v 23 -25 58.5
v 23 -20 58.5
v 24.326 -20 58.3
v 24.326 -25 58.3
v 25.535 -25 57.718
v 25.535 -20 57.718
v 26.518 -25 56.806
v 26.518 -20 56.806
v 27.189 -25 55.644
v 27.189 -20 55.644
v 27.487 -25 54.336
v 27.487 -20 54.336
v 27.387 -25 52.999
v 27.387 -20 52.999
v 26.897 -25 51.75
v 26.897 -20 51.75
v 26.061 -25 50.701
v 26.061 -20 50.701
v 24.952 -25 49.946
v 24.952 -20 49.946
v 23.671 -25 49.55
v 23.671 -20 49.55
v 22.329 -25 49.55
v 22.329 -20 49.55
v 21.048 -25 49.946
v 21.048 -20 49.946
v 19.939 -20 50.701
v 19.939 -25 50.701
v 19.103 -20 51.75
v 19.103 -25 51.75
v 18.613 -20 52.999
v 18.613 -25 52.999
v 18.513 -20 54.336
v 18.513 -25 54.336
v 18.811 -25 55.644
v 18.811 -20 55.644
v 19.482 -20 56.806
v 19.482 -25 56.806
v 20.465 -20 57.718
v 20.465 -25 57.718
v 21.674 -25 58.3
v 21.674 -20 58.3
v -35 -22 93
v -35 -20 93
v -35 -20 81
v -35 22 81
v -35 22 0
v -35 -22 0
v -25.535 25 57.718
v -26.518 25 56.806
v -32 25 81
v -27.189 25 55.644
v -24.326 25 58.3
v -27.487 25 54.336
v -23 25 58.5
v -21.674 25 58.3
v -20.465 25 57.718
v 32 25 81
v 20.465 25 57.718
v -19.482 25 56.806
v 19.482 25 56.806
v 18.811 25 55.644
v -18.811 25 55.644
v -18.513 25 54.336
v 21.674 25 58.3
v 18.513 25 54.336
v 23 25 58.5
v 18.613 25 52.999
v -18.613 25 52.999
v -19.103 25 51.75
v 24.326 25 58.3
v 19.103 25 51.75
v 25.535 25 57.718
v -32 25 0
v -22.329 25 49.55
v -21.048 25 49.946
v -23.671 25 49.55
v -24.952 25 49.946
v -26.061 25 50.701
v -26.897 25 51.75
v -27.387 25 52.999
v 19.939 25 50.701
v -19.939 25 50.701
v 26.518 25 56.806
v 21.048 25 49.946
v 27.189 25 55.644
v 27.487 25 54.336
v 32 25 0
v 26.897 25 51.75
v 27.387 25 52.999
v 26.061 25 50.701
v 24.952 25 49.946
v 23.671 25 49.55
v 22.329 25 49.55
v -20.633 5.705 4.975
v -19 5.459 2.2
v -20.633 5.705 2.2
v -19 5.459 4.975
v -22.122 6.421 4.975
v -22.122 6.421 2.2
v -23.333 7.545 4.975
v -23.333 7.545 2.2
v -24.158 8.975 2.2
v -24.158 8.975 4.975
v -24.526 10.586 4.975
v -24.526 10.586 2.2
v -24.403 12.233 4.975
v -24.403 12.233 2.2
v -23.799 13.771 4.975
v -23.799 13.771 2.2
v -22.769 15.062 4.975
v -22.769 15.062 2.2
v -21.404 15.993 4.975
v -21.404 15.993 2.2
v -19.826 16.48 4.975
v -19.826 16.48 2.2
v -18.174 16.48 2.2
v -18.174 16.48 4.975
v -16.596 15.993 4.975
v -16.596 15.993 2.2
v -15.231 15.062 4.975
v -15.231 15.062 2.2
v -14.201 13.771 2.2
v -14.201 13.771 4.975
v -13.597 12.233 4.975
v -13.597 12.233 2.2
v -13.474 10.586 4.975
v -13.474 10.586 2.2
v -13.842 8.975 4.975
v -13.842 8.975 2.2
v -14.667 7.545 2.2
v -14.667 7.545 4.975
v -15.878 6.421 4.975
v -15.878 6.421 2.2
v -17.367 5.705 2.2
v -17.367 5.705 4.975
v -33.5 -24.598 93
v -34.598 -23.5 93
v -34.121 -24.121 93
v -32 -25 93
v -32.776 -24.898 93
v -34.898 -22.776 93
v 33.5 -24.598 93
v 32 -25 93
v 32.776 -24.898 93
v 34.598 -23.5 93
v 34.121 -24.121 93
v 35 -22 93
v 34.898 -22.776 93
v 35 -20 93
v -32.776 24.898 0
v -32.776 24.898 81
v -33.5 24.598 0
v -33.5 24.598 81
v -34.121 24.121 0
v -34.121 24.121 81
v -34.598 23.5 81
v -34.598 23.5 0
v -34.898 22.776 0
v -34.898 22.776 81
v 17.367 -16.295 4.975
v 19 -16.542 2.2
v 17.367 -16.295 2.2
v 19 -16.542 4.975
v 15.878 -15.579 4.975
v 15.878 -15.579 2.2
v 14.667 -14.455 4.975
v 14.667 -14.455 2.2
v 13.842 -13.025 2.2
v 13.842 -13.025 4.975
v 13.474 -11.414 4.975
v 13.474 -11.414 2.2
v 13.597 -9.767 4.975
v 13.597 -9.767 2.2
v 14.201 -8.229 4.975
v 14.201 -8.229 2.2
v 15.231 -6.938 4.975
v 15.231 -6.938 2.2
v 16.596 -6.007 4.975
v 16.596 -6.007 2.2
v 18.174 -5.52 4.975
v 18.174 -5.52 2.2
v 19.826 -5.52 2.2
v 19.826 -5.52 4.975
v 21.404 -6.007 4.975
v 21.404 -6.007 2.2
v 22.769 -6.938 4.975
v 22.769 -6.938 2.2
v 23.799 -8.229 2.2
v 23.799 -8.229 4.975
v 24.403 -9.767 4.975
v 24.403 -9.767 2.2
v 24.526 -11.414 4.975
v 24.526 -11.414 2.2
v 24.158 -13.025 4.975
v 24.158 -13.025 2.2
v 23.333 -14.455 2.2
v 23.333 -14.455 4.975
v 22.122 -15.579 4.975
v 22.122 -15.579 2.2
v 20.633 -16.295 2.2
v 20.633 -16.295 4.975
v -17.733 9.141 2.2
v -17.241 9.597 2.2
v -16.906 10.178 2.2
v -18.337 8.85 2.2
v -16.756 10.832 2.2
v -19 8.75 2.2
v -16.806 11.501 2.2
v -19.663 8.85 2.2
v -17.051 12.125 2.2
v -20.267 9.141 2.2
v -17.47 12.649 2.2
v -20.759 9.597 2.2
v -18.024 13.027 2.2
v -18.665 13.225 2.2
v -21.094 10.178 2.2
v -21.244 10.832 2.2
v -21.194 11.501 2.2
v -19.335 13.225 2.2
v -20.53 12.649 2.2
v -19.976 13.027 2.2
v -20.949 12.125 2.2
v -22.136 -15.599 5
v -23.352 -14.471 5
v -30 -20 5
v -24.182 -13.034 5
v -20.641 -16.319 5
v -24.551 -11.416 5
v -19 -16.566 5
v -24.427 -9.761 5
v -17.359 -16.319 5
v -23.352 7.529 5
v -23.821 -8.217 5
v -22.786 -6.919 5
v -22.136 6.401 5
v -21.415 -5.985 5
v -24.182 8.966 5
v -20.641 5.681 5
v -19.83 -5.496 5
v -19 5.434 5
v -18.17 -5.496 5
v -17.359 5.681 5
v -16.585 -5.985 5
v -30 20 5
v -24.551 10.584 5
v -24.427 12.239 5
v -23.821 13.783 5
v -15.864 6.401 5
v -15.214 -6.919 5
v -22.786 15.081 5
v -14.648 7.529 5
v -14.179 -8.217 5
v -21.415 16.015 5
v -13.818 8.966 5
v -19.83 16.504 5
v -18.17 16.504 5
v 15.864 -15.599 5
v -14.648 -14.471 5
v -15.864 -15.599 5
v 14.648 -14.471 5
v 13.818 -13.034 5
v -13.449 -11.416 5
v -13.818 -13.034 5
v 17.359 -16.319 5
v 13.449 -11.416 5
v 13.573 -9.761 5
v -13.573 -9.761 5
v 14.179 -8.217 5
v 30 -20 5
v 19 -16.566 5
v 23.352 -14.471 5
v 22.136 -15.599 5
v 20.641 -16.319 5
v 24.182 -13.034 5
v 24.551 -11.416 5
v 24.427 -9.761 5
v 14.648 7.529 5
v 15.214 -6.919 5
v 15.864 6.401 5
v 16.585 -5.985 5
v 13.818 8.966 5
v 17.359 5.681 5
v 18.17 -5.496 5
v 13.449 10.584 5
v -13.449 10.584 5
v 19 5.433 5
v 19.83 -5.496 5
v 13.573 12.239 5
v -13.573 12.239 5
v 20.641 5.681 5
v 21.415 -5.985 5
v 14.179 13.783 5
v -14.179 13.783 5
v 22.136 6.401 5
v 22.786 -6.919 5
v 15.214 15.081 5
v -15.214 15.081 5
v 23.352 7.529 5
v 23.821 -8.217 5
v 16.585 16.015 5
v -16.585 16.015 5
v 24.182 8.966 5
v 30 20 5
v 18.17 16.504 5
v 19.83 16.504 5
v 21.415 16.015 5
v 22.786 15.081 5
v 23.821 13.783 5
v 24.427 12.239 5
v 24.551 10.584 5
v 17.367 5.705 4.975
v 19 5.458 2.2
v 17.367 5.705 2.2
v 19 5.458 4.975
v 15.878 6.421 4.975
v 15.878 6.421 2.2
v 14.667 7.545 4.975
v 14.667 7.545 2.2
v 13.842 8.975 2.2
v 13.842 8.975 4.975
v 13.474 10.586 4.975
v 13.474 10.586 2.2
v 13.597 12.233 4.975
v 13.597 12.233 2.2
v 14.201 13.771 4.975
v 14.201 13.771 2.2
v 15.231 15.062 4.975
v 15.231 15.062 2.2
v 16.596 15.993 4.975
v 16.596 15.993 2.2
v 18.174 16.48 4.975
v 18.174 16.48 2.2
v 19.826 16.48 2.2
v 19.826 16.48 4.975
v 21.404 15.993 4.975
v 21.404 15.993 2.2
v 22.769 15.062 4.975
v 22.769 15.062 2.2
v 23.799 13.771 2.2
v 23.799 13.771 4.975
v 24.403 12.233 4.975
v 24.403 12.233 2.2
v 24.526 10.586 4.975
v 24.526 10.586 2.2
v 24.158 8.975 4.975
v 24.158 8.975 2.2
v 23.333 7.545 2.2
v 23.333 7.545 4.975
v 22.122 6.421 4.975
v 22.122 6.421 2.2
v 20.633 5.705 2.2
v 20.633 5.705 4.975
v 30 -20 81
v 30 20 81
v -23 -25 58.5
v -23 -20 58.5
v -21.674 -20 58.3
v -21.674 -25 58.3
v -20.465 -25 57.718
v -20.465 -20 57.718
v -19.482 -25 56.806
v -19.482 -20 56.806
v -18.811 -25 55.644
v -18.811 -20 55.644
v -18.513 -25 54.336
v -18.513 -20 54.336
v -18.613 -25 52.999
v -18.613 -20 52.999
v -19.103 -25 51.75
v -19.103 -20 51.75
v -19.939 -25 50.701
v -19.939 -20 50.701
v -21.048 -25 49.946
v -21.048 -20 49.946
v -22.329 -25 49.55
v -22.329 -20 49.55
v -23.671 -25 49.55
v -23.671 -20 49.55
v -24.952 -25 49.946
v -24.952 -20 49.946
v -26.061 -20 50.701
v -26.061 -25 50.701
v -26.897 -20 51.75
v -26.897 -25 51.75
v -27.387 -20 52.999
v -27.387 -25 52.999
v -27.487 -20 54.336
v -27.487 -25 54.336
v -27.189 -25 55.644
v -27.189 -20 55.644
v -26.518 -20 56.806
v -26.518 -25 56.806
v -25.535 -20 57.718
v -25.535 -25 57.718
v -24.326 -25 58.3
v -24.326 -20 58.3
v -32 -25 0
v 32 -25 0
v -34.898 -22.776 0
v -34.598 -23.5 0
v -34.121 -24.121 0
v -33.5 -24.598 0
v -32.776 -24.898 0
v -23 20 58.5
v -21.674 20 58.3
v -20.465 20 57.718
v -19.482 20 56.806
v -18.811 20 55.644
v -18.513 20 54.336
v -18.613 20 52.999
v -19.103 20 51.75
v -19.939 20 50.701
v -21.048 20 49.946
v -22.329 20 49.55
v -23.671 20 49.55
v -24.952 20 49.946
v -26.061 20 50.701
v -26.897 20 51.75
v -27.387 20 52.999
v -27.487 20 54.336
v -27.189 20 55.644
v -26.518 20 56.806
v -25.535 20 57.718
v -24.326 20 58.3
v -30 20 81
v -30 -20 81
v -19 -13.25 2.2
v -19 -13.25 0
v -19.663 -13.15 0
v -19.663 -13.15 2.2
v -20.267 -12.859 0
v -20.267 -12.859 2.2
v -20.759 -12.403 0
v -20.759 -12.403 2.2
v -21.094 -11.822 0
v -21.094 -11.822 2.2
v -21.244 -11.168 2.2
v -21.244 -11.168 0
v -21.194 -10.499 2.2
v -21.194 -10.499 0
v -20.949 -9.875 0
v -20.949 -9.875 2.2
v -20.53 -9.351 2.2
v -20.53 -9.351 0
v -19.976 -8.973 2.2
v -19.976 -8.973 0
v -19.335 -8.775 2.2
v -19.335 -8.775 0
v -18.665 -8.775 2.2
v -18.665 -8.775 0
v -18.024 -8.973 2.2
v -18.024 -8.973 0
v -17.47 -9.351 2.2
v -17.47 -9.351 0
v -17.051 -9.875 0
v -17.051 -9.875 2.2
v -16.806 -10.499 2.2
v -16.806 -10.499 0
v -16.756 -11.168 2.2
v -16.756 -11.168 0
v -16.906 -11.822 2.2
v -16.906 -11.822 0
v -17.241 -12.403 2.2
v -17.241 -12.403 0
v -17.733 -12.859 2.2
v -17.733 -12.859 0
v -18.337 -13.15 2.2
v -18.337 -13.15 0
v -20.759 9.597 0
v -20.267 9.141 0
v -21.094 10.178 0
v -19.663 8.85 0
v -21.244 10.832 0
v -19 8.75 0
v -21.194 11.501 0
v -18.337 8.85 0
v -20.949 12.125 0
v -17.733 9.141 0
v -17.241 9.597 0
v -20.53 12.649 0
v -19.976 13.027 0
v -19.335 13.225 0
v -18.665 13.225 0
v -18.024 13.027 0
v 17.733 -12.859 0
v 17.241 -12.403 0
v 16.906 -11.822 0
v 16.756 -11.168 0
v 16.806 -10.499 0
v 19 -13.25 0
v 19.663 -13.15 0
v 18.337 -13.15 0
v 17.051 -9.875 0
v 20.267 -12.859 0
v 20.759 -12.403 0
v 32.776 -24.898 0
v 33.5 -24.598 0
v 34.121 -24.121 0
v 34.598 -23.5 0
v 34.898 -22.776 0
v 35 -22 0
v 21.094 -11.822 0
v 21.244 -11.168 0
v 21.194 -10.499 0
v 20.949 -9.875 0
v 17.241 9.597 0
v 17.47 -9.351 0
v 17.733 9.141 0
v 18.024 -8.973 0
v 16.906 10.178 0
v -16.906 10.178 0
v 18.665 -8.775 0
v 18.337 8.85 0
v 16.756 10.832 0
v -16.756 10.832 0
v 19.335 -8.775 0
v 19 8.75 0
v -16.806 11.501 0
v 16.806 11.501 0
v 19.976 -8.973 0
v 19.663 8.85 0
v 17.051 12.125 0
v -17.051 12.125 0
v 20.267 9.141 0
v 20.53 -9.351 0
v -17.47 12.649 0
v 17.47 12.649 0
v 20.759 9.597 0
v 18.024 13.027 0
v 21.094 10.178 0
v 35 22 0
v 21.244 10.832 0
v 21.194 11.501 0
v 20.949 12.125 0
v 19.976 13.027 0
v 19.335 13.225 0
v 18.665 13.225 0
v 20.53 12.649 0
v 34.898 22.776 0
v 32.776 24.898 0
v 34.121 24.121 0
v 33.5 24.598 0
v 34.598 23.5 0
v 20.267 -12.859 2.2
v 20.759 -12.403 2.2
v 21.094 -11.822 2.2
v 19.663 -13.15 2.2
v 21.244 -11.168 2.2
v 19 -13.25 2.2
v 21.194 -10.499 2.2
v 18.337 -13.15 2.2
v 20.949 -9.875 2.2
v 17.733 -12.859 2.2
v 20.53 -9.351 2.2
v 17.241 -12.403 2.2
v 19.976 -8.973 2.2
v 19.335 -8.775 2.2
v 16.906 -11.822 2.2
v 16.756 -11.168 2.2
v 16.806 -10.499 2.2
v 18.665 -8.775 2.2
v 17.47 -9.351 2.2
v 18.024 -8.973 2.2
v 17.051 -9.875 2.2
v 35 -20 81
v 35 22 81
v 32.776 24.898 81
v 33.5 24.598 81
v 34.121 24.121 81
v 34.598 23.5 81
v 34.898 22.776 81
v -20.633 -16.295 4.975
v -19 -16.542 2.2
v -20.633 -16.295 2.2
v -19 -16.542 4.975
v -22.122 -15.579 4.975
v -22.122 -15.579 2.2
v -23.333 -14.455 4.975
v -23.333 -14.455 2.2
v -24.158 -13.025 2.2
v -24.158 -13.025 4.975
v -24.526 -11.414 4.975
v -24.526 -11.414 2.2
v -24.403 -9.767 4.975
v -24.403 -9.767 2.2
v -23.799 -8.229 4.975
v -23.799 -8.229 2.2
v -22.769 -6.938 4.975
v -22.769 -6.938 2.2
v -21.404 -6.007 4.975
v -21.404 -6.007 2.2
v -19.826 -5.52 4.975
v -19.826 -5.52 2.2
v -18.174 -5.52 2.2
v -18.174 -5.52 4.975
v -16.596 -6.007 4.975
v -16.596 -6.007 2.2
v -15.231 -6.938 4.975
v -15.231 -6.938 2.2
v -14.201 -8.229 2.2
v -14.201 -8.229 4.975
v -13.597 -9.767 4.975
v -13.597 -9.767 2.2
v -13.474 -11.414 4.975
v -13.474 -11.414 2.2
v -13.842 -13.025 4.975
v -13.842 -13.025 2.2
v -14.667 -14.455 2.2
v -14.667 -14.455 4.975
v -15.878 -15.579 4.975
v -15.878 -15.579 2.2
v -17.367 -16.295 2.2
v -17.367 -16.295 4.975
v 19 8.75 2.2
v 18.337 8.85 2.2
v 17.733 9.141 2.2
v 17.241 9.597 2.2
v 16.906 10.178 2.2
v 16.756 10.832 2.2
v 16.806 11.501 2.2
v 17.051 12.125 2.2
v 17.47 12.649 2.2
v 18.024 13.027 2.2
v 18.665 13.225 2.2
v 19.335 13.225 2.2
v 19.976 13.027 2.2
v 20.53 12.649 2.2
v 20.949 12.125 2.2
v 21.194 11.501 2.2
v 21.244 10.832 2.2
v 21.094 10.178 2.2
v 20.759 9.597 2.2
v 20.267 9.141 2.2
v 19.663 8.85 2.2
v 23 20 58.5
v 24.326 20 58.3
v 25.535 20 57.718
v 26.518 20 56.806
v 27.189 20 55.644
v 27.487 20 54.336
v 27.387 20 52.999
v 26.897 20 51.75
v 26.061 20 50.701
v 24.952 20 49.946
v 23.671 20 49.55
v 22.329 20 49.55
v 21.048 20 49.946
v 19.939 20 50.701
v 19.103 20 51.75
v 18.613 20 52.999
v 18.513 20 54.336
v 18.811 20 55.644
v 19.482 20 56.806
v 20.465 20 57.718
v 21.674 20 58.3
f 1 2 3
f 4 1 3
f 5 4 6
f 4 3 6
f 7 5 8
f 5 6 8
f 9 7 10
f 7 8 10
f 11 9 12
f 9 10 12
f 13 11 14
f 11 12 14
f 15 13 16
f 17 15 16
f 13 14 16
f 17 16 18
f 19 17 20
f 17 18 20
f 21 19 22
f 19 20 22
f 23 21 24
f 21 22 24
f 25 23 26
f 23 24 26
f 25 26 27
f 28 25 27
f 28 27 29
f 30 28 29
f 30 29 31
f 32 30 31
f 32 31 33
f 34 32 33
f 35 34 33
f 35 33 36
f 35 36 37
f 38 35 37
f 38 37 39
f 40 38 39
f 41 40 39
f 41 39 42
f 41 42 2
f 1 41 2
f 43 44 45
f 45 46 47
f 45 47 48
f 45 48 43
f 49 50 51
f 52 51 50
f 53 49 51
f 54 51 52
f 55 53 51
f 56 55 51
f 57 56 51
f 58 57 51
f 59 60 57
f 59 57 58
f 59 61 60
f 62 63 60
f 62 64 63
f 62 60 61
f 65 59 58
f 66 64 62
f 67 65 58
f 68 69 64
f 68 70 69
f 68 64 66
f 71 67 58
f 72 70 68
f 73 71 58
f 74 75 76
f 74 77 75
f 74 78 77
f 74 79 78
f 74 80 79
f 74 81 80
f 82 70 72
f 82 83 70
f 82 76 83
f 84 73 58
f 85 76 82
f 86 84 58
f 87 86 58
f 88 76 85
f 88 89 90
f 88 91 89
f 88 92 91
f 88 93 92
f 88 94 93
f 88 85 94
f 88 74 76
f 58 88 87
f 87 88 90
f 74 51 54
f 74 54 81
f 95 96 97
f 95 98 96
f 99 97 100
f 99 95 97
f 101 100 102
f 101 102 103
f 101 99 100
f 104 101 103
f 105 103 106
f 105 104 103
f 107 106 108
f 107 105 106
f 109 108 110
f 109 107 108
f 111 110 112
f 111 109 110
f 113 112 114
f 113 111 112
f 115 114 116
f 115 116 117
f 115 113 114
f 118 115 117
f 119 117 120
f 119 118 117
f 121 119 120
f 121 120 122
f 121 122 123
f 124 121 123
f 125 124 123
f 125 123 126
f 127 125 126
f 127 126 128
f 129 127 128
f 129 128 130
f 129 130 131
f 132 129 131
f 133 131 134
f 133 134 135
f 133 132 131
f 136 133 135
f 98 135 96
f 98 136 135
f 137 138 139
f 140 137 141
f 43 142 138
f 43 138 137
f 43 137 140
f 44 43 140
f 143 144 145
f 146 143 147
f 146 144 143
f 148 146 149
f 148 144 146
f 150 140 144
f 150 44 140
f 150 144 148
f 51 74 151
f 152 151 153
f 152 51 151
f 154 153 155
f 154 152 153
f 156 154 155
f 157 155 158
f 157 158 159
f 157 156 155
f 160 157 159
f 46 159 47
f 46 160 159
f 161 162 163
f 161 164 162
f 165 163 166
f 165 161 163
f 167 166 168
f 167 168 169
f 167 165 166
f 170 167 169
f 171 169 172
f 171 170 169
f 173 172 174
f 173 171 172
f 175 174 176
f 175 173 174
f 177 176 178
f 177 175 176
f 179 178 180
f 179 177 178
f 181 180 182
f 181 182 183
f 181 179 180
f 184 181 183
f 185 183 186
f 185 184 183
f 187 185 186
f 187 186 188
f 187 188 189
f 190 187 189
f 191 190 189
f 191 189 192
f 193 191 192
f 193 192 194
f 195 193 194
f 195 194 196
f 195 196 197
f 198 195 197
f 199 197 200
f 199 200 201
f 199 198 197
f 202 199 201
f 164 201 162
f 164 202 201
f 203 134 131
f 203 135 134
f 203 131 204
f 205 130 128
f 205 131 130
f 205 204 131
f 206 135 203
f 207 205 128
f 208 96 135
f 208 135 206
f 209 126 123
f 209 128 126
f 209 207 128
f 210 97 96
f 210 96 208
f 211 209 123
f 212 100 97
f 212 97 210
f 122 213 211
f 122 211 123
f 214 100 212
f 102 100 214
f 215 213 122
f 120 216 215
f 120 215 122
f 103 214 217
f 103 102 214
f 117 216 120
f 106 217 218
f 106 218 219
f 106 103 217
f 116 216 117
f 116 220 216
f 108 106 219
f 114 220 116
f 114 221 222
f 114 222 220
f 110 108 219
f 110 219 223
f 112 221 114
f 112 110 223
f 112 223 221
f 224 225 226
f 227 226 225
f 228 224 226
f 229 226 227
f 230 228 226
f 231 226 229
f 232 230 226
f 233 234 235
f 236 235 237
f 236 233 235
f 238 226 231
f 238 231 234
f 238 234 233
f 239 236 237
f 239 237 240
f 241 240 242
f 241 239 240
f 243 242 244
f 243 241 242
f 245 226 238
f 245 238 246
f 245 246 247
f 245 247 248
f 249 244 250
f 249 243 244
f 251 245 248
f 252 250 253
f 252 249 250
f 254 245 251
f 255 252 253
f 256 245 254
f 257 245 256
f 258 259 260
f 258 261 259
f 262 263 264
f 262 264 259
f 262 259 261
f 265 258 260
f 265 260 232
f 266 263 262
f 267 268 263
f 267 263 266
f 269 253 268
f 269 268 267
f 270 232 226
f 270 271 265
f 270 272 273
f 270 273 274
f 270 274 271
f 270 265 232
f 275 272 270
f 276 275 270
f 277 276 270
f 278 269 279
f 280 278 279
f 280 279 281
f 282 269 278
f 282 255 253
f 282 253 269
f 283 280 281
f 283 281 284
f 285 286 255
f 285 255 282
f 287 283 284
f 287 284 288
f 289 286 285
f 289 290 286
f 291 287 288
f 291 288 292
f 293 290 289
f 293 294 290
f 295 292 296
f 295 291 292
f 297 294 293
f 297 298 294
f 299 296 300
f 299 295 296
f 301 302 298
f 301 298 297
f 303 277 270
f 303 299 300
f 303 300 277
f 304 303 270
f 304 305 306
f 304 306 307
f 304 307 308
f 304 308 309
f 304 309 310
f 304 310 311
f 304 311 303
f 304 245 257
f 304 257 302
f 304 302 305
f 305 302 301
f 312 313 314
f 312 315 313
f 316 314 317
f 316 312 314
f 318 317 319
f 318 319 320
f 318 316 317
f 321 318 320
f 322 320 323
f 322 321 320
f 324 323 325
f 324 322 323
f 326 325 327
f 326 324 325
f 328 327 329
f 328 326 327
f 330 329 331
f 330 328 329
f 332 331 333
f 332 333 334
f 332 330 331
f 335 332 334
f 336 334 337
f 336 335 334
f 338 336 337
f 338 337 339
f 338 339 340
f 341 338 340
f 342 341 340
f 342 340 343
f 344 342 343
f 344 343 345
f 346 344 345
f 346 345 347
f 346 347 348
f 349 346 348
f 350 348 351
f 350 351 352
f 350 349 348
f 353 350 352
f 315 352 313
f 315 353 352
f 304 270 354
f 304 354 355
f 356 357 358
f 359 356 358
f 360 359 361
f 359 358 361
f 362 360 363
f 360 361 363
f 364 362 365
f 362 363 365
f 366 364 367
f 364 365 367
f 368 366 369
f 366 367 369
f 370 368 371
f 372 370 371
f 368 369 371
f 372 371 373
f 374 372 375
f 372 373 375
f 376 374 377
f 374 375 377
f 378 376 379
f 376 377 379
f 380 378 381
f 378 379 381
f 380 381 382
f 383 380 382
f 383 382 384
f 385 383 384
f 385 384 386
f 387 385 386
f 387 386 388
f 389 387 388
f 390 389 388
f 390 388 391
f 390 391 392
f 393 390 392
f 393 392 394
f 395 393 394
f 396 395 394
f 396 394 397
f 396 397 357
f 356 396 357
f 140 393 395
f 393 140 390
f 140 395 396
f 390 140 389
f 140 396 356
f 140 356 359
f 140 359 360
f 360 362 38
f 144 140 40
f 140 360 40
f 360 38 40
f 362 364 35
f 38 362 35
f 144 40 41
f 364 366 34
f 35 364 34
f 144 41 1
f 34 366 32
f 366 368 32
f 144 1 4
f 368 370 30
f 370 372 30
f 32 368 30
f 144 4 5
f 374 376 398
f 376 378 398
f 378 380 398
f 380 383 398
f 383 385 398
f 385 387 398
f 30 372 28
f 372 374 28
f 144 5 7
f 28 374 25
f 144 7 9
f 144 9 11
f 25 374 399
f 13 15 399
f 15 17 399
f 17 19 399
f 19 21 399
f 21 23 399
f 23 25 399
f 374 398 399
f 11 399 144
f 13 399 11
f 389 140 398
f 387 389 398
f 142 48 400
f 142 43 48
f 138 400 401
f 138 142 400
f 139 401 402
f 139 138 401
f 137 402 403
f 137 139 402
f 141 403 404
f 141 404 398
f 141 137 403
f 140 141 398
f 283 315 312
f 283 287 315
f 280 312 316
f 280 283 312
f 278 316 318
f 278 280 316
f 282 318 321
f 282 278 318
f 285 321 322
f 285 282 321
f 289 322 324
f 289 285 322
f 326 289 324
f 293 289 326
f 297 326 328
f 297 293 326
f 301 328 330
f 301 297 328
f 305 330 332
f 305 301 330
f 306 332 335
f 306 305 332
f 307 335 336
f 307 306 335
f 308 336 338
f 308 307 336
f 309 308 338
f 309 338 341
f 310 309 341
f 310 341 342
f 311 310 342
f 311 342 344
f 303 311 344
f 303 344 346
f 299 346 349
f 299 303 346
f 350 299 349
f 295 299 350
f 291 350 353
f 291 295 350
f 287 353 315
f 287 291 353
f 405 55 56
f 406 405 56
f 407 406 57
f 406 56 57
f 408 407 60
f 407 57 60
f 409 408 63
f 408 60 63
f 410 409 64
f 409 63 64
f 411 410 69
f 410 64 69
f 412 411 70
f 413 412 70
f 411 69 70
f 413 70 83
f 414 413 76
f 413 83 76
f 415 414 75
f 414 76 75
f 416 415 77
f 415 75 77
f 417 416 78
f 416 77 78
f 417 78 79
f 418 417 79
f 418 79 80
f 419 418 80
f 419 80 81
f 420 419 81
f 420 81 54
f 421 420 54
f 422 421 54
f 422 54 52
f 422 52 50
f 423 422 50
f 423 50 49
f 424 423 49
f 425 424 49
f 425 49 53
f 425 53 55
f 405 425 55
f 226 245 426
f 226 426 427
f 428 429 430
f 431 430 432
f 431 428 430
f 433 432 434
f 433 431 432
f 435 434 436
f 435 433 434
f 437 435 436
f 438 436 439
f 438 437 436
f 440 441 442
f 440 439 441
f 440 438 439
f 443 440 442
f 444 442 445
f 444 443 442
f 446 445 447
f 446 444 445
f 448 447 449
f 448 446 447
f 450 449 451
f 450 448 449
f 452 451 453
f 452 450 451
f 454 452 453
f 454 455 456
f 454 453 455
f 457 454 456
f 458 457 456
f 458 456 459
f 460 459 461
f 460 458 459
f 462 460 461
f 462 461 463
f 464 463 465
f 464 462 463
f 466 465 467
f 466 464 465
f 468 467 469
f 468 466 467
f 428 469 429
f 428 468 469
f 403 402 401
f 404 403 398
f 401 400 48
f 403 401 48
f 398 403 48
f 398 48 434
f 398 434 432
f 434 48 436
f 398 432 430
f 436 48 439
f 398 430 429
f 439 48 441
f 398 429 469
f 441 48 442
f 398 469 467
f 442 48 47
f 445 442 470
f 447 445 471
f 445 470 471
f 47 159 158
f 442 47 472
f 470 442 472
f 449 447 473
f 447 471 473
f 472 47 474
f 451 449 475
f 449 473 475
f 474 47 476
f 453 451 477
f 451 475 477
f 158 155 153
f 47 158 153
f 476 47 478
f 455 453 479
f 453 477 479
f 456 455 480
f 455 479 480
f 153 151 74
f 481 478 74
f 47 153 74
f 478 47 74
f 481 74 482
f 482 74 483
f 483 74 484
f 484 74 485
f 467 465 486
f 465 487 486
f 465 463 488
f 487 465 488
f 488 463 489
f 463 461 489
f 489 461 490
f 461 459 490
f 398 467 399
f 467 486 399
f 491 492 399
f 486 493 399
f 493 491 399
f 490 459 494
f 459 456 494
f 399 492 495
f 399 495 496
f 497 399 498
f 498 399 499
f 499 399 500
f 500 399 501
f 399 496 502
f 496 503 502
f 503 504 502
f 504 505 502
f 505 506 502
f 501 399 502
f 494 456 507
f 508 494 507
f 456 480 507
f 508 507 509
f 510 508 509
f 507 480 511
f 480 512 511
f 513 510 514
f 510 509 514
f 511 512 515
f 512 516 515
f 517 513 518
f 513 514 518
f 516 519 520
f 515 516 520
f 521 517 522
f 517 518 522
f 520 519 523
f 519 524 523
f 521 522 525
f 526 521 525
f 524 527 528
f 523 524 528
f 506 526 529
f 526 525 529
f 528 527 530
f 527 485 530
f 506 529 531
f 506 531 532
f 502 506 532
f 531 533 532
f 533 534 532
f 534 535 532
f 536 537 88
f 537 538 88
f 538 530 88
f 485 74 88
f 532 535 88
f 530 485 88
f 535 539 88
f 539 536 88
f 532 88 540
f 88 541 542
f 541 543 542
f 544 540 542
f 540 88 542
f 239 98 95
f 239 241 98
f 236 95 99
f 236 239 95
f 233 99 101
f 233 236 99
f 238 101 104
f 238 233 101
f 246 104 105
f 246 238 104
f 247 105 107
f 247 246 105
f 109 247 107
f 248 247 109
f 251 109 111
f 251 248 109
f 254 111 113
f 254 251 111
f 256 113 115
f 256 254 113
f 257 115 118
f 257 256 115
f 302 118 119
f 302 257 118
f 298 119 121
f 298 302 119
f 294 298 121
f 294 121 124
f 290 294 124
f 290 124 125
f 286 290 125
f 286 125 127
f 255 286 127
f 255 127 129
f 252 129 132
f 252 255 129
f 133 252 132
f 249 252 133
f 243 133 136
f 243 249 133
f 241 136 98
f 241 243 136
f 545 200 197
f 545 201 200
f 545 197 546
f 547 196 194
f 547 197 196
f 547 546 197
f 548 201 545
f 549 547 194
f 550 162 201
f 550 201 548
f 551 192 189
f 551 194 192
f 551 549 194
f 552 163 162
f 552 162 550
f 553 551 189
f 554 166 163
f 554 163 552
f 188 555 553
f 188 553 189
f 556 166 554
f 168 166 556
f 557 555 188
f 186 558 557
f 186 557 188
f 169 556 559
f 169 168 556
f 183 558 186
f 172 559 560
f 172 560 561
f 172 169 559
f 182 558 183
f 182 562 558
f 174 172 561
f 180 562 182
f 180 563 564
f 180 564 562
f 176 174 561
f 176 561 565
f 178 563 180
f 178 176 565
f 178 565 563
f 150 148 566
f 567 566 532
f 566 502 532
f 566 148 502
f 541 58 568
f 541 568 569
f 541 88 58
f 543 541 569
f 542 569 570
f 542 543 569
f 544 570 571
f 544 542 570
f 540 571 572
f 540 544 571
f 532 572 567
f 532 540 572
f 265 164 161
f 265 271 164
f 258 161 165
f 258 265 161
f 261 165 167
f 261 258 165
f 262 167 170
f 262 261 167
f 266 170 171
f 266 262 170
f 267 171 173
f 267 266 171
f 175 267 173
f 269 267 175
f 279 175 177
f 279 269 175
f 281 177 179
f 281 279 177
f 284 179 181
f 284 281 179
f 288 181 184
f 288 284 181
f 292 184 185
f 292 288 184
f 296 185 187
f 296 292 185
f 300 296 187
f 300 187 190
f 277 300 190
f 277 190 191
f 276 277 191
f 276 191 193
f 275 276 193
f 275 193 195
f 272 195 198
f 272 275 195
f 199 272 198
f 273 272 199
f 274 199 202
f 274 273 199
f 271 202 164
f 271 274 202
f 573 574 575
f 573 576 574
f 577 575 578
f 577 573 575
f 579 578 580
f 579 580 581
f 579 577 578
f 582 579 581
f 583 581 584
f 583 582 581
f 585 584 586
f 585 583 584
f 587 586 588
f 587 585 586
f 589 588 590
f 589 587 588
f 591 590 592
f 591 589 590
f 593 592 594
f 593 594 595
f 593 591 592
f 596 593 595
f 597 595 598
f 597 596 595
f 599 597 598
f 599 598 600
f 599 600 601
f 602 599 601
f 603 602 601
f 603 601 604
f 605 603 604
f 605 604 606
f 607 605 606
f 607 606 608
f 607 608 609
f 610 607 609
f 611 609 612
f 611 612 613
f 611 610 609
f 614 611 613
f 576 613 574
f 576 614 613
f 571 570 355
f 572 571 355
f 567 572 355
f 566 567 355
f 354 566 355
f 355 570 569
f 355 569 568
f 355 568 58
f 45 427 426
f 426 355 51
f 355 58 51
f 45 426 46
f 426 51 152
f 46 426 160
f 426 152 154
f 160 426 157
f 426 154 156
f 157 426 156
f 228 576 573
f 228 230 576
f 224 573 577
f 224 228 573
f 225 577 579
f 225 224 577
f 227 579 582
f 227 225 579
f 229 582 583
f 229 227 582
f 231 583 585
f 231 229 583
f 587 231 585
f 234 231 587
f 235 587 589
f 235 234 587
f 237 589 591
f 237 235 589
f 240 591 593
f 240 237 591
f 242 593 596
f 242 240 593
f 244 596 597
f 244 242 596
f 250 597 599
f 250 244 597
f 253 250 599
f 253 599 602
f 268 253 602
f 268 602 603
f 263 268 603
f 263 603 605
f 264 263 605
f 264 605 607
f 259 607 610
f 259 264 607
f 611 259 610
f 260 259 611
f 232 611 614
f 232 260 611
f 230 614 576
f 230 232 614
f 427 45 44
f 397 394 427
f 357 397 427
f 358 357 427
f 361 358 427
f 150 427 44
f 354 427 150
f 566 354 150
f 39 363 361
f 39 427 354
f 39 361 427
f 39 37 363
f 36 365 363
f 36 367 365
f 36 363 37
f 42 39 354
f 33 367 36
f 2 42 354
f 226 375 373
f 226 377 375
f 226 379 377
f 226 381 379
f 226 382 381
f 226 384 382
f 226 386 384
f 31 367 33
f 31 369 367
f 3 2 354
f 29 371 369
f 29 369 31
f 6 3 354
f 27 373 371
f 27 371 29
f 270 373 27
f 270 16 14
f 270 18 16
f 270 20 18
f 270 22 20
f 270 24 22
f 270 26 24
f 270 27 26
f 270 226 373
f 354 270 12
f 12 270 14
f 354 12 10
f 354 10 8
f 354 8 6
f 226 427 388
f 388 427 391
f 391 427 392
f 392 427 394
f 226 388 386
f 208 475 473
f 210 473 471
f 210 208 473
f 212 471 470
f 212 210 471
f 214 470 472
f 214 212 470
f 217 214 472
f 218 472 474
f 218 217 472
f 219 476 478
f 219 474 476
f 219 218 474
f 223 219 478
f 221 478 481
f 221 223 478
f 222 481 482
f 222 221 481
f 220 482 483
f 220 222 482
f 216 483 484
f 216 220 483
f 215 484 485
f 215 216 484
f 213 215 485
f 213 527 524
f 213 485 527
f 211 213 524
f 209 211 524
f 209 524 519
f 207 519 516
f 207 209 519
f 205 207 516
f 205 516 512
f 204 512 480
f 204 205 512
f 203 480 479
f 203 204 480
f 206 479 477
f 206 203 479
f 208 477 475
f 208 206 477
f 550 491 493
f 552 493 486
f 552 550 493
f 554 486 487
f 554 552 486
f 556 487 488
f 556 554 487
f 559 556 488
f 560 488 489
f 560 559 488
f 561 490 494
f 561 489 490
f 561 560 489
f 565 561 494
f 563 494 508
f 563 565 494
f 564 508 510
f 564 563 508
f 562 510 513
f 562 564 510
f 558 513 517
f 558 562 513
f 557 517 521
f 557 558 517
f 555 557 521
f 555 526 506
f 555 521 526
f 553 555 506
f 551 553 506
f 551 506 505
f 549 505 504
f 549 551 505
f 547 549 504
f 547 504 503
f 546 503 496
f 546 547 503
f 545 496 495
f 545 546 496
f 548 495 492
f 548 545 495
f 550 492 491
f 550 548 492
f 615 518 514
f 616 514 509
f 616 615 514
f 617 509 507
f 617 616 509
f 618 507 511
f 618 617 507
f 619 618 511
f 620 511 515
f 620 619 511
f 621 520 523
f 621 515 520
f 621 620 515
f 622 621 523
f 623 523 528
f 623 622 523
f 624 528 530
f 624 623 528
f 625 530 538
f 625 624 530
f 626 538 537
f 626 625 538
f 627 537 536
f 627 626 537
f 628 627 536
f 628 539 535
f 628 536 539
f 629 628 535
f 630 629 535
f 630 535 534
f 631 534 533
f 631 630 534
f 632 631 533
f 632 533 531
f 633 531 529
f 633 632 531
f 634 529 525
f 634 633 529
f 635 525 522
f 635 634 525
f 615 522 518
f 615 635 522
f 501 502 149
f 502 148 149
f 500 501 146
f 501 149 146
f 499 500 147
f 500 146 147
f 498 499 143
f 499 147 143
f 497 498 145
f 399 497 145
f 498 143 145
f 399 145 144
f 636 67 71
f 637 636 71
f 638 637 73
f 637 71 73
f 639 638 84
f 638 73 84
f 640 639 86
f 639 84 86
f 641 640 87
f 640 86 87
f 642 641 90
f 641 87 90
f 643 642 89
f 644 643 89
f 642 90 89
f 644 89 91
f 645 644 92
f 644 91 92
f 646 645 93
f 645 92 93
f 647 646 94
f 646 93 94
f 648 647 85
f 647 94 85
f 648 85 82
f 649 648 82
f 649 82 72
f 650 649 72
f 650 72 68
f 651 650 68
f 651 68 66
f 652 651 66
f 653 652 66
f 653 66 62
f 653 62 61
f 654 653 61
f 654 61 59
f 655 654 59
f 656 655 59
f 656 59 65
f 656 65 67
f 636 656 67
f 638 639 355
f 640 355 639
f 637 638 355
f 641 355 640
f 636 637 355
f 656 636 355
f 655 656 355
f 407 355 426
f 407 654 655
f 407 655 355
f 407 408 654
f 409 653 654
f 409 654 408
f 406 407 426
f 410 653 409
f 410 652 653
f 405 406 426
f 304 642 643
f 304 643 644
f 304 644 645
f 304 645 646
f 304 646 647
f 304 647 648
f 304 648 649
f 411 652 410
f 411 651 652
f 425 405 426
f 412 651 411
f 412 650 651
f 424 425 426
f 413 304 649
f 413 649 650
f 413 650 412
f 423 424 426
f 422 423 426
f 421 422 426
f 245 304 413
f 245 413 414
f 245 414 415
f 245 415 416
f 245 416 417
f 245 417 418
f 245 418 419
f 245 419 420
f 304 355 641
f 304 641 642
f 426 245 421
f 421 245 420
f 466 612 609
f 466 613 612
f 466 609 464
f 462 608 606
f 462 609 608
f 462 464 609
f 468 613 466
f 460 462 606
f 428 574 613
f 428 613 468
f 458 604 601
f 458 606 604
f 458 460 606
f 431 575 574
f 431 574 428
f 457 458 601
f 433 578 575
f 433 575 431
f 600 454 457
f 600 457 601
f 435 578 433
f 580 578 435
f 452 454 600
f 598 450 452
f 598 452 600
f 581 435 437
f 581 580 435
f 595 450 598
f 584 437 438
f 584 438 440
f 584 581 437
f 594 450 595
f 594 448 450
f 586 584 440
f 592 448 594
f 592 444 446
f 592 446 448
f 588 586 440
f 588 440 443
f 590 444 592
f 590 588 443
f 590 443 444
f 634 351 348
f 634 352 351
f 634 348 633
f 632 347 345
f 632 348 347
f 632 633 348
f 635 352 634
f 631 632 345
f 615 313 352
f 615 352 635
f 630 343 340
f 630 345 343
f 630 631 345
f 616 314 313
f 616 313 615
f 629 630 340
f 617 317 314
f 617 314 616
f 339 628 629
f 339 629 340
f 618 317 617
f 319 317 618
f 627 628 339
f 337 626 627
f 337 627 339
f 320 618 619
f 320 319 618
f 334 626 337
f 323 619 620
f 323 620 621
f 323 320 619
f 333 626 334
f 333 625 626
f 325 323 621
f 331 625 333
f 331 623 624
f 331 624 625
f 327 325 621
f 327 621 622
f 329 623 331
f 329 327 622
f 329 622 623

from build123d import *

# Parameters (mm, degrees)
SKETCH1_W                                   = 70
SKETCH1_H                                   = 50
BOSS_EXTRUDE1_DEPTH                         = 5
SKETCH2_W                                   = 70
SKETCH2_H                                   = 5
BOSS_EXTRUDE2_DEPTH                         = 88
BOSS_EXTRUDE3_DEPTH                         = 76
SKETCH4_R                                   = 4.5
CUT_EXTRUDE1_DEPTH                          = 56
FILLET1_R                                   = 3
CBORE_FOR_M4_HEX_HEAD_CAP_SCREW1_AT_2_COUNT = 2
CBORE_FOR_M4_HEX_HEAD_CAP_SCREW1_AT_2_PITCH = 22
CBORE_FOR_M4_HEX_HEAD_CAP_SCREW1_AT_3_COUNT = 2
CBORE_FOR_M4_HEX_HEAD_CAP_SCREW1_AT_3_PITCH = 43.9089968
CBORE_FOR_M4_HEX_HEAD_CAP_SCREW1_AT_4_COUNT = 2
CBORE_FOR_M4_HEX_HEAD_CAP_SCREW1_AT_4_PITCH = 38


with BuildPart() as part:
    # Sketch1 → Boss-Extrude1 (new body)
    with BuildSketch(Plane.XY):
        Rectangle(SKETCH1_W, SKETCH1_H)
    extrude(amount=BOSS_EXTRUDE1_DEPTH)

    # Sketch2 → Boss-Extrude2 (add)
    with BuildSketch(Plane.XY.offset(5)):
        with Locations((0, -22.5)):
            Rectangle(SKETCH2_W, SKETCH2_H)
    extrude(amount=BOSS_EXTRUDE2_DEPTH)

    # Sketch3 → Boss-Extrude3 (add)
    with BuildSketch(Plane.XY.offset(5)):
        Polygon((-35, 25), (35, 25), (35, 20), (35, -20), (30, -20), (30, 20), (-30, 20), (-30, -20), (-35, -20), (-35, 20), align=None)
    extrude(amount=BOSS_EXTRUDE3_DEPTH)

    # Sketch4 → Cut-Extrude1 (cut)
    with BuildSketch(Plane(origin=(0, 25, 0), x_dir=(1, 0, 0), z_dir=(0, 1, 0))):
        with Locations(Location((23, -54, 0), (0, 0, 270))):
            Circle(SKETCH4_R)
        with Locations(Location((-23, -54, 0), (0, 0, 270))):
            Circle(SKETCH4_R)
    extrude(amount=-CUT_EXTRUDE1_DEPTH, mode=Mode.SUBTRACT)

    # Fillet1
    fillet1_edges = [part.edges().sort_by_distance(p)[0] for p in [
        (-35, 25, 40.5),
        (35, 25, 40.5),
        (35, -25, 46.5),
        (-35, -25, 46.5),
    ]]
    fillet(fillet1_edges, radius=FILLET1_R)

    # Sketch7 → CBORE for M4 Hex Head Cap Screw1 (revolve, cut)
    with BuildSketch(Plane(origin=(-19, -11, 5), x_dir=(0, -1, 0), z_dir=(1, 0, 0))):
        Polygon((0, 0), (0, 12.4), (2.25, 11.048063607), (2.25, 2.8), (5.5415, 2.8), (5.5415, 0.025), (5.5665, 0), align=None)
    cbore_for_m4_hex_head_cap_screw1 = revolve(axis=Axis((-19, -11, 11.35), (0, 0, -1)), mode=Mode.SUBTRACT)

    # CBORE for M4 Hex Head Cap Screw1 at 2: CBORE for M4 Hex Head Cap Screw1 ×2
    with Locations(*[(0, i * CBORE_FOR_M4_HEX_HEAD_CAP_SCREW1_AT_2_PITCH, 0) for i in range(1, CBORE_FOR_M4_HEX_HEAD_CAP_SCREW1_AT_2_COUNT)]):
        add(cbore_for_m4_hex_head_cap_screw1, mode=Mode.SUBTRACT)

    # CBORE for M4 Hex Head Cap Screw1 at 3: CBORE for M4 Hex Head Cap Screw1 ×2
    with Locations(*[Vector(0.8654262854811263, 0.5010362705417046, 0) * (i * CBORE_FOR_M4_HEX_HEAD_CAP_SCREW1_AT_3_PITCH) for i in range(1, CBORE_FOR_M4_HEX_HEAD_CAP_SCREW1_AT_3_COUNT)]):
        add(cbore_for_m4_hex_head_cap_screw1, mode=Mode.SUBTRACT)

    # CBORE for M4 Hex Head Cap Screw1 at 4: CBORE for M4 Hex Head Cap Screw1 ×2
    with Locations(*[(i * CBORE_FOR_M4_HEX_HEAD_CAP_SCREW1_AT_4_PITCH, 0, 0) for i in range(1, CBORE_FOR_M4_HEX_HEAD_CAP_SCREW1_AT_4_COUNT)]):
        add(cbore_for_m4_hex_head_cap_screw1, mode=Mode.SUBTRACT)


solid = part.part
